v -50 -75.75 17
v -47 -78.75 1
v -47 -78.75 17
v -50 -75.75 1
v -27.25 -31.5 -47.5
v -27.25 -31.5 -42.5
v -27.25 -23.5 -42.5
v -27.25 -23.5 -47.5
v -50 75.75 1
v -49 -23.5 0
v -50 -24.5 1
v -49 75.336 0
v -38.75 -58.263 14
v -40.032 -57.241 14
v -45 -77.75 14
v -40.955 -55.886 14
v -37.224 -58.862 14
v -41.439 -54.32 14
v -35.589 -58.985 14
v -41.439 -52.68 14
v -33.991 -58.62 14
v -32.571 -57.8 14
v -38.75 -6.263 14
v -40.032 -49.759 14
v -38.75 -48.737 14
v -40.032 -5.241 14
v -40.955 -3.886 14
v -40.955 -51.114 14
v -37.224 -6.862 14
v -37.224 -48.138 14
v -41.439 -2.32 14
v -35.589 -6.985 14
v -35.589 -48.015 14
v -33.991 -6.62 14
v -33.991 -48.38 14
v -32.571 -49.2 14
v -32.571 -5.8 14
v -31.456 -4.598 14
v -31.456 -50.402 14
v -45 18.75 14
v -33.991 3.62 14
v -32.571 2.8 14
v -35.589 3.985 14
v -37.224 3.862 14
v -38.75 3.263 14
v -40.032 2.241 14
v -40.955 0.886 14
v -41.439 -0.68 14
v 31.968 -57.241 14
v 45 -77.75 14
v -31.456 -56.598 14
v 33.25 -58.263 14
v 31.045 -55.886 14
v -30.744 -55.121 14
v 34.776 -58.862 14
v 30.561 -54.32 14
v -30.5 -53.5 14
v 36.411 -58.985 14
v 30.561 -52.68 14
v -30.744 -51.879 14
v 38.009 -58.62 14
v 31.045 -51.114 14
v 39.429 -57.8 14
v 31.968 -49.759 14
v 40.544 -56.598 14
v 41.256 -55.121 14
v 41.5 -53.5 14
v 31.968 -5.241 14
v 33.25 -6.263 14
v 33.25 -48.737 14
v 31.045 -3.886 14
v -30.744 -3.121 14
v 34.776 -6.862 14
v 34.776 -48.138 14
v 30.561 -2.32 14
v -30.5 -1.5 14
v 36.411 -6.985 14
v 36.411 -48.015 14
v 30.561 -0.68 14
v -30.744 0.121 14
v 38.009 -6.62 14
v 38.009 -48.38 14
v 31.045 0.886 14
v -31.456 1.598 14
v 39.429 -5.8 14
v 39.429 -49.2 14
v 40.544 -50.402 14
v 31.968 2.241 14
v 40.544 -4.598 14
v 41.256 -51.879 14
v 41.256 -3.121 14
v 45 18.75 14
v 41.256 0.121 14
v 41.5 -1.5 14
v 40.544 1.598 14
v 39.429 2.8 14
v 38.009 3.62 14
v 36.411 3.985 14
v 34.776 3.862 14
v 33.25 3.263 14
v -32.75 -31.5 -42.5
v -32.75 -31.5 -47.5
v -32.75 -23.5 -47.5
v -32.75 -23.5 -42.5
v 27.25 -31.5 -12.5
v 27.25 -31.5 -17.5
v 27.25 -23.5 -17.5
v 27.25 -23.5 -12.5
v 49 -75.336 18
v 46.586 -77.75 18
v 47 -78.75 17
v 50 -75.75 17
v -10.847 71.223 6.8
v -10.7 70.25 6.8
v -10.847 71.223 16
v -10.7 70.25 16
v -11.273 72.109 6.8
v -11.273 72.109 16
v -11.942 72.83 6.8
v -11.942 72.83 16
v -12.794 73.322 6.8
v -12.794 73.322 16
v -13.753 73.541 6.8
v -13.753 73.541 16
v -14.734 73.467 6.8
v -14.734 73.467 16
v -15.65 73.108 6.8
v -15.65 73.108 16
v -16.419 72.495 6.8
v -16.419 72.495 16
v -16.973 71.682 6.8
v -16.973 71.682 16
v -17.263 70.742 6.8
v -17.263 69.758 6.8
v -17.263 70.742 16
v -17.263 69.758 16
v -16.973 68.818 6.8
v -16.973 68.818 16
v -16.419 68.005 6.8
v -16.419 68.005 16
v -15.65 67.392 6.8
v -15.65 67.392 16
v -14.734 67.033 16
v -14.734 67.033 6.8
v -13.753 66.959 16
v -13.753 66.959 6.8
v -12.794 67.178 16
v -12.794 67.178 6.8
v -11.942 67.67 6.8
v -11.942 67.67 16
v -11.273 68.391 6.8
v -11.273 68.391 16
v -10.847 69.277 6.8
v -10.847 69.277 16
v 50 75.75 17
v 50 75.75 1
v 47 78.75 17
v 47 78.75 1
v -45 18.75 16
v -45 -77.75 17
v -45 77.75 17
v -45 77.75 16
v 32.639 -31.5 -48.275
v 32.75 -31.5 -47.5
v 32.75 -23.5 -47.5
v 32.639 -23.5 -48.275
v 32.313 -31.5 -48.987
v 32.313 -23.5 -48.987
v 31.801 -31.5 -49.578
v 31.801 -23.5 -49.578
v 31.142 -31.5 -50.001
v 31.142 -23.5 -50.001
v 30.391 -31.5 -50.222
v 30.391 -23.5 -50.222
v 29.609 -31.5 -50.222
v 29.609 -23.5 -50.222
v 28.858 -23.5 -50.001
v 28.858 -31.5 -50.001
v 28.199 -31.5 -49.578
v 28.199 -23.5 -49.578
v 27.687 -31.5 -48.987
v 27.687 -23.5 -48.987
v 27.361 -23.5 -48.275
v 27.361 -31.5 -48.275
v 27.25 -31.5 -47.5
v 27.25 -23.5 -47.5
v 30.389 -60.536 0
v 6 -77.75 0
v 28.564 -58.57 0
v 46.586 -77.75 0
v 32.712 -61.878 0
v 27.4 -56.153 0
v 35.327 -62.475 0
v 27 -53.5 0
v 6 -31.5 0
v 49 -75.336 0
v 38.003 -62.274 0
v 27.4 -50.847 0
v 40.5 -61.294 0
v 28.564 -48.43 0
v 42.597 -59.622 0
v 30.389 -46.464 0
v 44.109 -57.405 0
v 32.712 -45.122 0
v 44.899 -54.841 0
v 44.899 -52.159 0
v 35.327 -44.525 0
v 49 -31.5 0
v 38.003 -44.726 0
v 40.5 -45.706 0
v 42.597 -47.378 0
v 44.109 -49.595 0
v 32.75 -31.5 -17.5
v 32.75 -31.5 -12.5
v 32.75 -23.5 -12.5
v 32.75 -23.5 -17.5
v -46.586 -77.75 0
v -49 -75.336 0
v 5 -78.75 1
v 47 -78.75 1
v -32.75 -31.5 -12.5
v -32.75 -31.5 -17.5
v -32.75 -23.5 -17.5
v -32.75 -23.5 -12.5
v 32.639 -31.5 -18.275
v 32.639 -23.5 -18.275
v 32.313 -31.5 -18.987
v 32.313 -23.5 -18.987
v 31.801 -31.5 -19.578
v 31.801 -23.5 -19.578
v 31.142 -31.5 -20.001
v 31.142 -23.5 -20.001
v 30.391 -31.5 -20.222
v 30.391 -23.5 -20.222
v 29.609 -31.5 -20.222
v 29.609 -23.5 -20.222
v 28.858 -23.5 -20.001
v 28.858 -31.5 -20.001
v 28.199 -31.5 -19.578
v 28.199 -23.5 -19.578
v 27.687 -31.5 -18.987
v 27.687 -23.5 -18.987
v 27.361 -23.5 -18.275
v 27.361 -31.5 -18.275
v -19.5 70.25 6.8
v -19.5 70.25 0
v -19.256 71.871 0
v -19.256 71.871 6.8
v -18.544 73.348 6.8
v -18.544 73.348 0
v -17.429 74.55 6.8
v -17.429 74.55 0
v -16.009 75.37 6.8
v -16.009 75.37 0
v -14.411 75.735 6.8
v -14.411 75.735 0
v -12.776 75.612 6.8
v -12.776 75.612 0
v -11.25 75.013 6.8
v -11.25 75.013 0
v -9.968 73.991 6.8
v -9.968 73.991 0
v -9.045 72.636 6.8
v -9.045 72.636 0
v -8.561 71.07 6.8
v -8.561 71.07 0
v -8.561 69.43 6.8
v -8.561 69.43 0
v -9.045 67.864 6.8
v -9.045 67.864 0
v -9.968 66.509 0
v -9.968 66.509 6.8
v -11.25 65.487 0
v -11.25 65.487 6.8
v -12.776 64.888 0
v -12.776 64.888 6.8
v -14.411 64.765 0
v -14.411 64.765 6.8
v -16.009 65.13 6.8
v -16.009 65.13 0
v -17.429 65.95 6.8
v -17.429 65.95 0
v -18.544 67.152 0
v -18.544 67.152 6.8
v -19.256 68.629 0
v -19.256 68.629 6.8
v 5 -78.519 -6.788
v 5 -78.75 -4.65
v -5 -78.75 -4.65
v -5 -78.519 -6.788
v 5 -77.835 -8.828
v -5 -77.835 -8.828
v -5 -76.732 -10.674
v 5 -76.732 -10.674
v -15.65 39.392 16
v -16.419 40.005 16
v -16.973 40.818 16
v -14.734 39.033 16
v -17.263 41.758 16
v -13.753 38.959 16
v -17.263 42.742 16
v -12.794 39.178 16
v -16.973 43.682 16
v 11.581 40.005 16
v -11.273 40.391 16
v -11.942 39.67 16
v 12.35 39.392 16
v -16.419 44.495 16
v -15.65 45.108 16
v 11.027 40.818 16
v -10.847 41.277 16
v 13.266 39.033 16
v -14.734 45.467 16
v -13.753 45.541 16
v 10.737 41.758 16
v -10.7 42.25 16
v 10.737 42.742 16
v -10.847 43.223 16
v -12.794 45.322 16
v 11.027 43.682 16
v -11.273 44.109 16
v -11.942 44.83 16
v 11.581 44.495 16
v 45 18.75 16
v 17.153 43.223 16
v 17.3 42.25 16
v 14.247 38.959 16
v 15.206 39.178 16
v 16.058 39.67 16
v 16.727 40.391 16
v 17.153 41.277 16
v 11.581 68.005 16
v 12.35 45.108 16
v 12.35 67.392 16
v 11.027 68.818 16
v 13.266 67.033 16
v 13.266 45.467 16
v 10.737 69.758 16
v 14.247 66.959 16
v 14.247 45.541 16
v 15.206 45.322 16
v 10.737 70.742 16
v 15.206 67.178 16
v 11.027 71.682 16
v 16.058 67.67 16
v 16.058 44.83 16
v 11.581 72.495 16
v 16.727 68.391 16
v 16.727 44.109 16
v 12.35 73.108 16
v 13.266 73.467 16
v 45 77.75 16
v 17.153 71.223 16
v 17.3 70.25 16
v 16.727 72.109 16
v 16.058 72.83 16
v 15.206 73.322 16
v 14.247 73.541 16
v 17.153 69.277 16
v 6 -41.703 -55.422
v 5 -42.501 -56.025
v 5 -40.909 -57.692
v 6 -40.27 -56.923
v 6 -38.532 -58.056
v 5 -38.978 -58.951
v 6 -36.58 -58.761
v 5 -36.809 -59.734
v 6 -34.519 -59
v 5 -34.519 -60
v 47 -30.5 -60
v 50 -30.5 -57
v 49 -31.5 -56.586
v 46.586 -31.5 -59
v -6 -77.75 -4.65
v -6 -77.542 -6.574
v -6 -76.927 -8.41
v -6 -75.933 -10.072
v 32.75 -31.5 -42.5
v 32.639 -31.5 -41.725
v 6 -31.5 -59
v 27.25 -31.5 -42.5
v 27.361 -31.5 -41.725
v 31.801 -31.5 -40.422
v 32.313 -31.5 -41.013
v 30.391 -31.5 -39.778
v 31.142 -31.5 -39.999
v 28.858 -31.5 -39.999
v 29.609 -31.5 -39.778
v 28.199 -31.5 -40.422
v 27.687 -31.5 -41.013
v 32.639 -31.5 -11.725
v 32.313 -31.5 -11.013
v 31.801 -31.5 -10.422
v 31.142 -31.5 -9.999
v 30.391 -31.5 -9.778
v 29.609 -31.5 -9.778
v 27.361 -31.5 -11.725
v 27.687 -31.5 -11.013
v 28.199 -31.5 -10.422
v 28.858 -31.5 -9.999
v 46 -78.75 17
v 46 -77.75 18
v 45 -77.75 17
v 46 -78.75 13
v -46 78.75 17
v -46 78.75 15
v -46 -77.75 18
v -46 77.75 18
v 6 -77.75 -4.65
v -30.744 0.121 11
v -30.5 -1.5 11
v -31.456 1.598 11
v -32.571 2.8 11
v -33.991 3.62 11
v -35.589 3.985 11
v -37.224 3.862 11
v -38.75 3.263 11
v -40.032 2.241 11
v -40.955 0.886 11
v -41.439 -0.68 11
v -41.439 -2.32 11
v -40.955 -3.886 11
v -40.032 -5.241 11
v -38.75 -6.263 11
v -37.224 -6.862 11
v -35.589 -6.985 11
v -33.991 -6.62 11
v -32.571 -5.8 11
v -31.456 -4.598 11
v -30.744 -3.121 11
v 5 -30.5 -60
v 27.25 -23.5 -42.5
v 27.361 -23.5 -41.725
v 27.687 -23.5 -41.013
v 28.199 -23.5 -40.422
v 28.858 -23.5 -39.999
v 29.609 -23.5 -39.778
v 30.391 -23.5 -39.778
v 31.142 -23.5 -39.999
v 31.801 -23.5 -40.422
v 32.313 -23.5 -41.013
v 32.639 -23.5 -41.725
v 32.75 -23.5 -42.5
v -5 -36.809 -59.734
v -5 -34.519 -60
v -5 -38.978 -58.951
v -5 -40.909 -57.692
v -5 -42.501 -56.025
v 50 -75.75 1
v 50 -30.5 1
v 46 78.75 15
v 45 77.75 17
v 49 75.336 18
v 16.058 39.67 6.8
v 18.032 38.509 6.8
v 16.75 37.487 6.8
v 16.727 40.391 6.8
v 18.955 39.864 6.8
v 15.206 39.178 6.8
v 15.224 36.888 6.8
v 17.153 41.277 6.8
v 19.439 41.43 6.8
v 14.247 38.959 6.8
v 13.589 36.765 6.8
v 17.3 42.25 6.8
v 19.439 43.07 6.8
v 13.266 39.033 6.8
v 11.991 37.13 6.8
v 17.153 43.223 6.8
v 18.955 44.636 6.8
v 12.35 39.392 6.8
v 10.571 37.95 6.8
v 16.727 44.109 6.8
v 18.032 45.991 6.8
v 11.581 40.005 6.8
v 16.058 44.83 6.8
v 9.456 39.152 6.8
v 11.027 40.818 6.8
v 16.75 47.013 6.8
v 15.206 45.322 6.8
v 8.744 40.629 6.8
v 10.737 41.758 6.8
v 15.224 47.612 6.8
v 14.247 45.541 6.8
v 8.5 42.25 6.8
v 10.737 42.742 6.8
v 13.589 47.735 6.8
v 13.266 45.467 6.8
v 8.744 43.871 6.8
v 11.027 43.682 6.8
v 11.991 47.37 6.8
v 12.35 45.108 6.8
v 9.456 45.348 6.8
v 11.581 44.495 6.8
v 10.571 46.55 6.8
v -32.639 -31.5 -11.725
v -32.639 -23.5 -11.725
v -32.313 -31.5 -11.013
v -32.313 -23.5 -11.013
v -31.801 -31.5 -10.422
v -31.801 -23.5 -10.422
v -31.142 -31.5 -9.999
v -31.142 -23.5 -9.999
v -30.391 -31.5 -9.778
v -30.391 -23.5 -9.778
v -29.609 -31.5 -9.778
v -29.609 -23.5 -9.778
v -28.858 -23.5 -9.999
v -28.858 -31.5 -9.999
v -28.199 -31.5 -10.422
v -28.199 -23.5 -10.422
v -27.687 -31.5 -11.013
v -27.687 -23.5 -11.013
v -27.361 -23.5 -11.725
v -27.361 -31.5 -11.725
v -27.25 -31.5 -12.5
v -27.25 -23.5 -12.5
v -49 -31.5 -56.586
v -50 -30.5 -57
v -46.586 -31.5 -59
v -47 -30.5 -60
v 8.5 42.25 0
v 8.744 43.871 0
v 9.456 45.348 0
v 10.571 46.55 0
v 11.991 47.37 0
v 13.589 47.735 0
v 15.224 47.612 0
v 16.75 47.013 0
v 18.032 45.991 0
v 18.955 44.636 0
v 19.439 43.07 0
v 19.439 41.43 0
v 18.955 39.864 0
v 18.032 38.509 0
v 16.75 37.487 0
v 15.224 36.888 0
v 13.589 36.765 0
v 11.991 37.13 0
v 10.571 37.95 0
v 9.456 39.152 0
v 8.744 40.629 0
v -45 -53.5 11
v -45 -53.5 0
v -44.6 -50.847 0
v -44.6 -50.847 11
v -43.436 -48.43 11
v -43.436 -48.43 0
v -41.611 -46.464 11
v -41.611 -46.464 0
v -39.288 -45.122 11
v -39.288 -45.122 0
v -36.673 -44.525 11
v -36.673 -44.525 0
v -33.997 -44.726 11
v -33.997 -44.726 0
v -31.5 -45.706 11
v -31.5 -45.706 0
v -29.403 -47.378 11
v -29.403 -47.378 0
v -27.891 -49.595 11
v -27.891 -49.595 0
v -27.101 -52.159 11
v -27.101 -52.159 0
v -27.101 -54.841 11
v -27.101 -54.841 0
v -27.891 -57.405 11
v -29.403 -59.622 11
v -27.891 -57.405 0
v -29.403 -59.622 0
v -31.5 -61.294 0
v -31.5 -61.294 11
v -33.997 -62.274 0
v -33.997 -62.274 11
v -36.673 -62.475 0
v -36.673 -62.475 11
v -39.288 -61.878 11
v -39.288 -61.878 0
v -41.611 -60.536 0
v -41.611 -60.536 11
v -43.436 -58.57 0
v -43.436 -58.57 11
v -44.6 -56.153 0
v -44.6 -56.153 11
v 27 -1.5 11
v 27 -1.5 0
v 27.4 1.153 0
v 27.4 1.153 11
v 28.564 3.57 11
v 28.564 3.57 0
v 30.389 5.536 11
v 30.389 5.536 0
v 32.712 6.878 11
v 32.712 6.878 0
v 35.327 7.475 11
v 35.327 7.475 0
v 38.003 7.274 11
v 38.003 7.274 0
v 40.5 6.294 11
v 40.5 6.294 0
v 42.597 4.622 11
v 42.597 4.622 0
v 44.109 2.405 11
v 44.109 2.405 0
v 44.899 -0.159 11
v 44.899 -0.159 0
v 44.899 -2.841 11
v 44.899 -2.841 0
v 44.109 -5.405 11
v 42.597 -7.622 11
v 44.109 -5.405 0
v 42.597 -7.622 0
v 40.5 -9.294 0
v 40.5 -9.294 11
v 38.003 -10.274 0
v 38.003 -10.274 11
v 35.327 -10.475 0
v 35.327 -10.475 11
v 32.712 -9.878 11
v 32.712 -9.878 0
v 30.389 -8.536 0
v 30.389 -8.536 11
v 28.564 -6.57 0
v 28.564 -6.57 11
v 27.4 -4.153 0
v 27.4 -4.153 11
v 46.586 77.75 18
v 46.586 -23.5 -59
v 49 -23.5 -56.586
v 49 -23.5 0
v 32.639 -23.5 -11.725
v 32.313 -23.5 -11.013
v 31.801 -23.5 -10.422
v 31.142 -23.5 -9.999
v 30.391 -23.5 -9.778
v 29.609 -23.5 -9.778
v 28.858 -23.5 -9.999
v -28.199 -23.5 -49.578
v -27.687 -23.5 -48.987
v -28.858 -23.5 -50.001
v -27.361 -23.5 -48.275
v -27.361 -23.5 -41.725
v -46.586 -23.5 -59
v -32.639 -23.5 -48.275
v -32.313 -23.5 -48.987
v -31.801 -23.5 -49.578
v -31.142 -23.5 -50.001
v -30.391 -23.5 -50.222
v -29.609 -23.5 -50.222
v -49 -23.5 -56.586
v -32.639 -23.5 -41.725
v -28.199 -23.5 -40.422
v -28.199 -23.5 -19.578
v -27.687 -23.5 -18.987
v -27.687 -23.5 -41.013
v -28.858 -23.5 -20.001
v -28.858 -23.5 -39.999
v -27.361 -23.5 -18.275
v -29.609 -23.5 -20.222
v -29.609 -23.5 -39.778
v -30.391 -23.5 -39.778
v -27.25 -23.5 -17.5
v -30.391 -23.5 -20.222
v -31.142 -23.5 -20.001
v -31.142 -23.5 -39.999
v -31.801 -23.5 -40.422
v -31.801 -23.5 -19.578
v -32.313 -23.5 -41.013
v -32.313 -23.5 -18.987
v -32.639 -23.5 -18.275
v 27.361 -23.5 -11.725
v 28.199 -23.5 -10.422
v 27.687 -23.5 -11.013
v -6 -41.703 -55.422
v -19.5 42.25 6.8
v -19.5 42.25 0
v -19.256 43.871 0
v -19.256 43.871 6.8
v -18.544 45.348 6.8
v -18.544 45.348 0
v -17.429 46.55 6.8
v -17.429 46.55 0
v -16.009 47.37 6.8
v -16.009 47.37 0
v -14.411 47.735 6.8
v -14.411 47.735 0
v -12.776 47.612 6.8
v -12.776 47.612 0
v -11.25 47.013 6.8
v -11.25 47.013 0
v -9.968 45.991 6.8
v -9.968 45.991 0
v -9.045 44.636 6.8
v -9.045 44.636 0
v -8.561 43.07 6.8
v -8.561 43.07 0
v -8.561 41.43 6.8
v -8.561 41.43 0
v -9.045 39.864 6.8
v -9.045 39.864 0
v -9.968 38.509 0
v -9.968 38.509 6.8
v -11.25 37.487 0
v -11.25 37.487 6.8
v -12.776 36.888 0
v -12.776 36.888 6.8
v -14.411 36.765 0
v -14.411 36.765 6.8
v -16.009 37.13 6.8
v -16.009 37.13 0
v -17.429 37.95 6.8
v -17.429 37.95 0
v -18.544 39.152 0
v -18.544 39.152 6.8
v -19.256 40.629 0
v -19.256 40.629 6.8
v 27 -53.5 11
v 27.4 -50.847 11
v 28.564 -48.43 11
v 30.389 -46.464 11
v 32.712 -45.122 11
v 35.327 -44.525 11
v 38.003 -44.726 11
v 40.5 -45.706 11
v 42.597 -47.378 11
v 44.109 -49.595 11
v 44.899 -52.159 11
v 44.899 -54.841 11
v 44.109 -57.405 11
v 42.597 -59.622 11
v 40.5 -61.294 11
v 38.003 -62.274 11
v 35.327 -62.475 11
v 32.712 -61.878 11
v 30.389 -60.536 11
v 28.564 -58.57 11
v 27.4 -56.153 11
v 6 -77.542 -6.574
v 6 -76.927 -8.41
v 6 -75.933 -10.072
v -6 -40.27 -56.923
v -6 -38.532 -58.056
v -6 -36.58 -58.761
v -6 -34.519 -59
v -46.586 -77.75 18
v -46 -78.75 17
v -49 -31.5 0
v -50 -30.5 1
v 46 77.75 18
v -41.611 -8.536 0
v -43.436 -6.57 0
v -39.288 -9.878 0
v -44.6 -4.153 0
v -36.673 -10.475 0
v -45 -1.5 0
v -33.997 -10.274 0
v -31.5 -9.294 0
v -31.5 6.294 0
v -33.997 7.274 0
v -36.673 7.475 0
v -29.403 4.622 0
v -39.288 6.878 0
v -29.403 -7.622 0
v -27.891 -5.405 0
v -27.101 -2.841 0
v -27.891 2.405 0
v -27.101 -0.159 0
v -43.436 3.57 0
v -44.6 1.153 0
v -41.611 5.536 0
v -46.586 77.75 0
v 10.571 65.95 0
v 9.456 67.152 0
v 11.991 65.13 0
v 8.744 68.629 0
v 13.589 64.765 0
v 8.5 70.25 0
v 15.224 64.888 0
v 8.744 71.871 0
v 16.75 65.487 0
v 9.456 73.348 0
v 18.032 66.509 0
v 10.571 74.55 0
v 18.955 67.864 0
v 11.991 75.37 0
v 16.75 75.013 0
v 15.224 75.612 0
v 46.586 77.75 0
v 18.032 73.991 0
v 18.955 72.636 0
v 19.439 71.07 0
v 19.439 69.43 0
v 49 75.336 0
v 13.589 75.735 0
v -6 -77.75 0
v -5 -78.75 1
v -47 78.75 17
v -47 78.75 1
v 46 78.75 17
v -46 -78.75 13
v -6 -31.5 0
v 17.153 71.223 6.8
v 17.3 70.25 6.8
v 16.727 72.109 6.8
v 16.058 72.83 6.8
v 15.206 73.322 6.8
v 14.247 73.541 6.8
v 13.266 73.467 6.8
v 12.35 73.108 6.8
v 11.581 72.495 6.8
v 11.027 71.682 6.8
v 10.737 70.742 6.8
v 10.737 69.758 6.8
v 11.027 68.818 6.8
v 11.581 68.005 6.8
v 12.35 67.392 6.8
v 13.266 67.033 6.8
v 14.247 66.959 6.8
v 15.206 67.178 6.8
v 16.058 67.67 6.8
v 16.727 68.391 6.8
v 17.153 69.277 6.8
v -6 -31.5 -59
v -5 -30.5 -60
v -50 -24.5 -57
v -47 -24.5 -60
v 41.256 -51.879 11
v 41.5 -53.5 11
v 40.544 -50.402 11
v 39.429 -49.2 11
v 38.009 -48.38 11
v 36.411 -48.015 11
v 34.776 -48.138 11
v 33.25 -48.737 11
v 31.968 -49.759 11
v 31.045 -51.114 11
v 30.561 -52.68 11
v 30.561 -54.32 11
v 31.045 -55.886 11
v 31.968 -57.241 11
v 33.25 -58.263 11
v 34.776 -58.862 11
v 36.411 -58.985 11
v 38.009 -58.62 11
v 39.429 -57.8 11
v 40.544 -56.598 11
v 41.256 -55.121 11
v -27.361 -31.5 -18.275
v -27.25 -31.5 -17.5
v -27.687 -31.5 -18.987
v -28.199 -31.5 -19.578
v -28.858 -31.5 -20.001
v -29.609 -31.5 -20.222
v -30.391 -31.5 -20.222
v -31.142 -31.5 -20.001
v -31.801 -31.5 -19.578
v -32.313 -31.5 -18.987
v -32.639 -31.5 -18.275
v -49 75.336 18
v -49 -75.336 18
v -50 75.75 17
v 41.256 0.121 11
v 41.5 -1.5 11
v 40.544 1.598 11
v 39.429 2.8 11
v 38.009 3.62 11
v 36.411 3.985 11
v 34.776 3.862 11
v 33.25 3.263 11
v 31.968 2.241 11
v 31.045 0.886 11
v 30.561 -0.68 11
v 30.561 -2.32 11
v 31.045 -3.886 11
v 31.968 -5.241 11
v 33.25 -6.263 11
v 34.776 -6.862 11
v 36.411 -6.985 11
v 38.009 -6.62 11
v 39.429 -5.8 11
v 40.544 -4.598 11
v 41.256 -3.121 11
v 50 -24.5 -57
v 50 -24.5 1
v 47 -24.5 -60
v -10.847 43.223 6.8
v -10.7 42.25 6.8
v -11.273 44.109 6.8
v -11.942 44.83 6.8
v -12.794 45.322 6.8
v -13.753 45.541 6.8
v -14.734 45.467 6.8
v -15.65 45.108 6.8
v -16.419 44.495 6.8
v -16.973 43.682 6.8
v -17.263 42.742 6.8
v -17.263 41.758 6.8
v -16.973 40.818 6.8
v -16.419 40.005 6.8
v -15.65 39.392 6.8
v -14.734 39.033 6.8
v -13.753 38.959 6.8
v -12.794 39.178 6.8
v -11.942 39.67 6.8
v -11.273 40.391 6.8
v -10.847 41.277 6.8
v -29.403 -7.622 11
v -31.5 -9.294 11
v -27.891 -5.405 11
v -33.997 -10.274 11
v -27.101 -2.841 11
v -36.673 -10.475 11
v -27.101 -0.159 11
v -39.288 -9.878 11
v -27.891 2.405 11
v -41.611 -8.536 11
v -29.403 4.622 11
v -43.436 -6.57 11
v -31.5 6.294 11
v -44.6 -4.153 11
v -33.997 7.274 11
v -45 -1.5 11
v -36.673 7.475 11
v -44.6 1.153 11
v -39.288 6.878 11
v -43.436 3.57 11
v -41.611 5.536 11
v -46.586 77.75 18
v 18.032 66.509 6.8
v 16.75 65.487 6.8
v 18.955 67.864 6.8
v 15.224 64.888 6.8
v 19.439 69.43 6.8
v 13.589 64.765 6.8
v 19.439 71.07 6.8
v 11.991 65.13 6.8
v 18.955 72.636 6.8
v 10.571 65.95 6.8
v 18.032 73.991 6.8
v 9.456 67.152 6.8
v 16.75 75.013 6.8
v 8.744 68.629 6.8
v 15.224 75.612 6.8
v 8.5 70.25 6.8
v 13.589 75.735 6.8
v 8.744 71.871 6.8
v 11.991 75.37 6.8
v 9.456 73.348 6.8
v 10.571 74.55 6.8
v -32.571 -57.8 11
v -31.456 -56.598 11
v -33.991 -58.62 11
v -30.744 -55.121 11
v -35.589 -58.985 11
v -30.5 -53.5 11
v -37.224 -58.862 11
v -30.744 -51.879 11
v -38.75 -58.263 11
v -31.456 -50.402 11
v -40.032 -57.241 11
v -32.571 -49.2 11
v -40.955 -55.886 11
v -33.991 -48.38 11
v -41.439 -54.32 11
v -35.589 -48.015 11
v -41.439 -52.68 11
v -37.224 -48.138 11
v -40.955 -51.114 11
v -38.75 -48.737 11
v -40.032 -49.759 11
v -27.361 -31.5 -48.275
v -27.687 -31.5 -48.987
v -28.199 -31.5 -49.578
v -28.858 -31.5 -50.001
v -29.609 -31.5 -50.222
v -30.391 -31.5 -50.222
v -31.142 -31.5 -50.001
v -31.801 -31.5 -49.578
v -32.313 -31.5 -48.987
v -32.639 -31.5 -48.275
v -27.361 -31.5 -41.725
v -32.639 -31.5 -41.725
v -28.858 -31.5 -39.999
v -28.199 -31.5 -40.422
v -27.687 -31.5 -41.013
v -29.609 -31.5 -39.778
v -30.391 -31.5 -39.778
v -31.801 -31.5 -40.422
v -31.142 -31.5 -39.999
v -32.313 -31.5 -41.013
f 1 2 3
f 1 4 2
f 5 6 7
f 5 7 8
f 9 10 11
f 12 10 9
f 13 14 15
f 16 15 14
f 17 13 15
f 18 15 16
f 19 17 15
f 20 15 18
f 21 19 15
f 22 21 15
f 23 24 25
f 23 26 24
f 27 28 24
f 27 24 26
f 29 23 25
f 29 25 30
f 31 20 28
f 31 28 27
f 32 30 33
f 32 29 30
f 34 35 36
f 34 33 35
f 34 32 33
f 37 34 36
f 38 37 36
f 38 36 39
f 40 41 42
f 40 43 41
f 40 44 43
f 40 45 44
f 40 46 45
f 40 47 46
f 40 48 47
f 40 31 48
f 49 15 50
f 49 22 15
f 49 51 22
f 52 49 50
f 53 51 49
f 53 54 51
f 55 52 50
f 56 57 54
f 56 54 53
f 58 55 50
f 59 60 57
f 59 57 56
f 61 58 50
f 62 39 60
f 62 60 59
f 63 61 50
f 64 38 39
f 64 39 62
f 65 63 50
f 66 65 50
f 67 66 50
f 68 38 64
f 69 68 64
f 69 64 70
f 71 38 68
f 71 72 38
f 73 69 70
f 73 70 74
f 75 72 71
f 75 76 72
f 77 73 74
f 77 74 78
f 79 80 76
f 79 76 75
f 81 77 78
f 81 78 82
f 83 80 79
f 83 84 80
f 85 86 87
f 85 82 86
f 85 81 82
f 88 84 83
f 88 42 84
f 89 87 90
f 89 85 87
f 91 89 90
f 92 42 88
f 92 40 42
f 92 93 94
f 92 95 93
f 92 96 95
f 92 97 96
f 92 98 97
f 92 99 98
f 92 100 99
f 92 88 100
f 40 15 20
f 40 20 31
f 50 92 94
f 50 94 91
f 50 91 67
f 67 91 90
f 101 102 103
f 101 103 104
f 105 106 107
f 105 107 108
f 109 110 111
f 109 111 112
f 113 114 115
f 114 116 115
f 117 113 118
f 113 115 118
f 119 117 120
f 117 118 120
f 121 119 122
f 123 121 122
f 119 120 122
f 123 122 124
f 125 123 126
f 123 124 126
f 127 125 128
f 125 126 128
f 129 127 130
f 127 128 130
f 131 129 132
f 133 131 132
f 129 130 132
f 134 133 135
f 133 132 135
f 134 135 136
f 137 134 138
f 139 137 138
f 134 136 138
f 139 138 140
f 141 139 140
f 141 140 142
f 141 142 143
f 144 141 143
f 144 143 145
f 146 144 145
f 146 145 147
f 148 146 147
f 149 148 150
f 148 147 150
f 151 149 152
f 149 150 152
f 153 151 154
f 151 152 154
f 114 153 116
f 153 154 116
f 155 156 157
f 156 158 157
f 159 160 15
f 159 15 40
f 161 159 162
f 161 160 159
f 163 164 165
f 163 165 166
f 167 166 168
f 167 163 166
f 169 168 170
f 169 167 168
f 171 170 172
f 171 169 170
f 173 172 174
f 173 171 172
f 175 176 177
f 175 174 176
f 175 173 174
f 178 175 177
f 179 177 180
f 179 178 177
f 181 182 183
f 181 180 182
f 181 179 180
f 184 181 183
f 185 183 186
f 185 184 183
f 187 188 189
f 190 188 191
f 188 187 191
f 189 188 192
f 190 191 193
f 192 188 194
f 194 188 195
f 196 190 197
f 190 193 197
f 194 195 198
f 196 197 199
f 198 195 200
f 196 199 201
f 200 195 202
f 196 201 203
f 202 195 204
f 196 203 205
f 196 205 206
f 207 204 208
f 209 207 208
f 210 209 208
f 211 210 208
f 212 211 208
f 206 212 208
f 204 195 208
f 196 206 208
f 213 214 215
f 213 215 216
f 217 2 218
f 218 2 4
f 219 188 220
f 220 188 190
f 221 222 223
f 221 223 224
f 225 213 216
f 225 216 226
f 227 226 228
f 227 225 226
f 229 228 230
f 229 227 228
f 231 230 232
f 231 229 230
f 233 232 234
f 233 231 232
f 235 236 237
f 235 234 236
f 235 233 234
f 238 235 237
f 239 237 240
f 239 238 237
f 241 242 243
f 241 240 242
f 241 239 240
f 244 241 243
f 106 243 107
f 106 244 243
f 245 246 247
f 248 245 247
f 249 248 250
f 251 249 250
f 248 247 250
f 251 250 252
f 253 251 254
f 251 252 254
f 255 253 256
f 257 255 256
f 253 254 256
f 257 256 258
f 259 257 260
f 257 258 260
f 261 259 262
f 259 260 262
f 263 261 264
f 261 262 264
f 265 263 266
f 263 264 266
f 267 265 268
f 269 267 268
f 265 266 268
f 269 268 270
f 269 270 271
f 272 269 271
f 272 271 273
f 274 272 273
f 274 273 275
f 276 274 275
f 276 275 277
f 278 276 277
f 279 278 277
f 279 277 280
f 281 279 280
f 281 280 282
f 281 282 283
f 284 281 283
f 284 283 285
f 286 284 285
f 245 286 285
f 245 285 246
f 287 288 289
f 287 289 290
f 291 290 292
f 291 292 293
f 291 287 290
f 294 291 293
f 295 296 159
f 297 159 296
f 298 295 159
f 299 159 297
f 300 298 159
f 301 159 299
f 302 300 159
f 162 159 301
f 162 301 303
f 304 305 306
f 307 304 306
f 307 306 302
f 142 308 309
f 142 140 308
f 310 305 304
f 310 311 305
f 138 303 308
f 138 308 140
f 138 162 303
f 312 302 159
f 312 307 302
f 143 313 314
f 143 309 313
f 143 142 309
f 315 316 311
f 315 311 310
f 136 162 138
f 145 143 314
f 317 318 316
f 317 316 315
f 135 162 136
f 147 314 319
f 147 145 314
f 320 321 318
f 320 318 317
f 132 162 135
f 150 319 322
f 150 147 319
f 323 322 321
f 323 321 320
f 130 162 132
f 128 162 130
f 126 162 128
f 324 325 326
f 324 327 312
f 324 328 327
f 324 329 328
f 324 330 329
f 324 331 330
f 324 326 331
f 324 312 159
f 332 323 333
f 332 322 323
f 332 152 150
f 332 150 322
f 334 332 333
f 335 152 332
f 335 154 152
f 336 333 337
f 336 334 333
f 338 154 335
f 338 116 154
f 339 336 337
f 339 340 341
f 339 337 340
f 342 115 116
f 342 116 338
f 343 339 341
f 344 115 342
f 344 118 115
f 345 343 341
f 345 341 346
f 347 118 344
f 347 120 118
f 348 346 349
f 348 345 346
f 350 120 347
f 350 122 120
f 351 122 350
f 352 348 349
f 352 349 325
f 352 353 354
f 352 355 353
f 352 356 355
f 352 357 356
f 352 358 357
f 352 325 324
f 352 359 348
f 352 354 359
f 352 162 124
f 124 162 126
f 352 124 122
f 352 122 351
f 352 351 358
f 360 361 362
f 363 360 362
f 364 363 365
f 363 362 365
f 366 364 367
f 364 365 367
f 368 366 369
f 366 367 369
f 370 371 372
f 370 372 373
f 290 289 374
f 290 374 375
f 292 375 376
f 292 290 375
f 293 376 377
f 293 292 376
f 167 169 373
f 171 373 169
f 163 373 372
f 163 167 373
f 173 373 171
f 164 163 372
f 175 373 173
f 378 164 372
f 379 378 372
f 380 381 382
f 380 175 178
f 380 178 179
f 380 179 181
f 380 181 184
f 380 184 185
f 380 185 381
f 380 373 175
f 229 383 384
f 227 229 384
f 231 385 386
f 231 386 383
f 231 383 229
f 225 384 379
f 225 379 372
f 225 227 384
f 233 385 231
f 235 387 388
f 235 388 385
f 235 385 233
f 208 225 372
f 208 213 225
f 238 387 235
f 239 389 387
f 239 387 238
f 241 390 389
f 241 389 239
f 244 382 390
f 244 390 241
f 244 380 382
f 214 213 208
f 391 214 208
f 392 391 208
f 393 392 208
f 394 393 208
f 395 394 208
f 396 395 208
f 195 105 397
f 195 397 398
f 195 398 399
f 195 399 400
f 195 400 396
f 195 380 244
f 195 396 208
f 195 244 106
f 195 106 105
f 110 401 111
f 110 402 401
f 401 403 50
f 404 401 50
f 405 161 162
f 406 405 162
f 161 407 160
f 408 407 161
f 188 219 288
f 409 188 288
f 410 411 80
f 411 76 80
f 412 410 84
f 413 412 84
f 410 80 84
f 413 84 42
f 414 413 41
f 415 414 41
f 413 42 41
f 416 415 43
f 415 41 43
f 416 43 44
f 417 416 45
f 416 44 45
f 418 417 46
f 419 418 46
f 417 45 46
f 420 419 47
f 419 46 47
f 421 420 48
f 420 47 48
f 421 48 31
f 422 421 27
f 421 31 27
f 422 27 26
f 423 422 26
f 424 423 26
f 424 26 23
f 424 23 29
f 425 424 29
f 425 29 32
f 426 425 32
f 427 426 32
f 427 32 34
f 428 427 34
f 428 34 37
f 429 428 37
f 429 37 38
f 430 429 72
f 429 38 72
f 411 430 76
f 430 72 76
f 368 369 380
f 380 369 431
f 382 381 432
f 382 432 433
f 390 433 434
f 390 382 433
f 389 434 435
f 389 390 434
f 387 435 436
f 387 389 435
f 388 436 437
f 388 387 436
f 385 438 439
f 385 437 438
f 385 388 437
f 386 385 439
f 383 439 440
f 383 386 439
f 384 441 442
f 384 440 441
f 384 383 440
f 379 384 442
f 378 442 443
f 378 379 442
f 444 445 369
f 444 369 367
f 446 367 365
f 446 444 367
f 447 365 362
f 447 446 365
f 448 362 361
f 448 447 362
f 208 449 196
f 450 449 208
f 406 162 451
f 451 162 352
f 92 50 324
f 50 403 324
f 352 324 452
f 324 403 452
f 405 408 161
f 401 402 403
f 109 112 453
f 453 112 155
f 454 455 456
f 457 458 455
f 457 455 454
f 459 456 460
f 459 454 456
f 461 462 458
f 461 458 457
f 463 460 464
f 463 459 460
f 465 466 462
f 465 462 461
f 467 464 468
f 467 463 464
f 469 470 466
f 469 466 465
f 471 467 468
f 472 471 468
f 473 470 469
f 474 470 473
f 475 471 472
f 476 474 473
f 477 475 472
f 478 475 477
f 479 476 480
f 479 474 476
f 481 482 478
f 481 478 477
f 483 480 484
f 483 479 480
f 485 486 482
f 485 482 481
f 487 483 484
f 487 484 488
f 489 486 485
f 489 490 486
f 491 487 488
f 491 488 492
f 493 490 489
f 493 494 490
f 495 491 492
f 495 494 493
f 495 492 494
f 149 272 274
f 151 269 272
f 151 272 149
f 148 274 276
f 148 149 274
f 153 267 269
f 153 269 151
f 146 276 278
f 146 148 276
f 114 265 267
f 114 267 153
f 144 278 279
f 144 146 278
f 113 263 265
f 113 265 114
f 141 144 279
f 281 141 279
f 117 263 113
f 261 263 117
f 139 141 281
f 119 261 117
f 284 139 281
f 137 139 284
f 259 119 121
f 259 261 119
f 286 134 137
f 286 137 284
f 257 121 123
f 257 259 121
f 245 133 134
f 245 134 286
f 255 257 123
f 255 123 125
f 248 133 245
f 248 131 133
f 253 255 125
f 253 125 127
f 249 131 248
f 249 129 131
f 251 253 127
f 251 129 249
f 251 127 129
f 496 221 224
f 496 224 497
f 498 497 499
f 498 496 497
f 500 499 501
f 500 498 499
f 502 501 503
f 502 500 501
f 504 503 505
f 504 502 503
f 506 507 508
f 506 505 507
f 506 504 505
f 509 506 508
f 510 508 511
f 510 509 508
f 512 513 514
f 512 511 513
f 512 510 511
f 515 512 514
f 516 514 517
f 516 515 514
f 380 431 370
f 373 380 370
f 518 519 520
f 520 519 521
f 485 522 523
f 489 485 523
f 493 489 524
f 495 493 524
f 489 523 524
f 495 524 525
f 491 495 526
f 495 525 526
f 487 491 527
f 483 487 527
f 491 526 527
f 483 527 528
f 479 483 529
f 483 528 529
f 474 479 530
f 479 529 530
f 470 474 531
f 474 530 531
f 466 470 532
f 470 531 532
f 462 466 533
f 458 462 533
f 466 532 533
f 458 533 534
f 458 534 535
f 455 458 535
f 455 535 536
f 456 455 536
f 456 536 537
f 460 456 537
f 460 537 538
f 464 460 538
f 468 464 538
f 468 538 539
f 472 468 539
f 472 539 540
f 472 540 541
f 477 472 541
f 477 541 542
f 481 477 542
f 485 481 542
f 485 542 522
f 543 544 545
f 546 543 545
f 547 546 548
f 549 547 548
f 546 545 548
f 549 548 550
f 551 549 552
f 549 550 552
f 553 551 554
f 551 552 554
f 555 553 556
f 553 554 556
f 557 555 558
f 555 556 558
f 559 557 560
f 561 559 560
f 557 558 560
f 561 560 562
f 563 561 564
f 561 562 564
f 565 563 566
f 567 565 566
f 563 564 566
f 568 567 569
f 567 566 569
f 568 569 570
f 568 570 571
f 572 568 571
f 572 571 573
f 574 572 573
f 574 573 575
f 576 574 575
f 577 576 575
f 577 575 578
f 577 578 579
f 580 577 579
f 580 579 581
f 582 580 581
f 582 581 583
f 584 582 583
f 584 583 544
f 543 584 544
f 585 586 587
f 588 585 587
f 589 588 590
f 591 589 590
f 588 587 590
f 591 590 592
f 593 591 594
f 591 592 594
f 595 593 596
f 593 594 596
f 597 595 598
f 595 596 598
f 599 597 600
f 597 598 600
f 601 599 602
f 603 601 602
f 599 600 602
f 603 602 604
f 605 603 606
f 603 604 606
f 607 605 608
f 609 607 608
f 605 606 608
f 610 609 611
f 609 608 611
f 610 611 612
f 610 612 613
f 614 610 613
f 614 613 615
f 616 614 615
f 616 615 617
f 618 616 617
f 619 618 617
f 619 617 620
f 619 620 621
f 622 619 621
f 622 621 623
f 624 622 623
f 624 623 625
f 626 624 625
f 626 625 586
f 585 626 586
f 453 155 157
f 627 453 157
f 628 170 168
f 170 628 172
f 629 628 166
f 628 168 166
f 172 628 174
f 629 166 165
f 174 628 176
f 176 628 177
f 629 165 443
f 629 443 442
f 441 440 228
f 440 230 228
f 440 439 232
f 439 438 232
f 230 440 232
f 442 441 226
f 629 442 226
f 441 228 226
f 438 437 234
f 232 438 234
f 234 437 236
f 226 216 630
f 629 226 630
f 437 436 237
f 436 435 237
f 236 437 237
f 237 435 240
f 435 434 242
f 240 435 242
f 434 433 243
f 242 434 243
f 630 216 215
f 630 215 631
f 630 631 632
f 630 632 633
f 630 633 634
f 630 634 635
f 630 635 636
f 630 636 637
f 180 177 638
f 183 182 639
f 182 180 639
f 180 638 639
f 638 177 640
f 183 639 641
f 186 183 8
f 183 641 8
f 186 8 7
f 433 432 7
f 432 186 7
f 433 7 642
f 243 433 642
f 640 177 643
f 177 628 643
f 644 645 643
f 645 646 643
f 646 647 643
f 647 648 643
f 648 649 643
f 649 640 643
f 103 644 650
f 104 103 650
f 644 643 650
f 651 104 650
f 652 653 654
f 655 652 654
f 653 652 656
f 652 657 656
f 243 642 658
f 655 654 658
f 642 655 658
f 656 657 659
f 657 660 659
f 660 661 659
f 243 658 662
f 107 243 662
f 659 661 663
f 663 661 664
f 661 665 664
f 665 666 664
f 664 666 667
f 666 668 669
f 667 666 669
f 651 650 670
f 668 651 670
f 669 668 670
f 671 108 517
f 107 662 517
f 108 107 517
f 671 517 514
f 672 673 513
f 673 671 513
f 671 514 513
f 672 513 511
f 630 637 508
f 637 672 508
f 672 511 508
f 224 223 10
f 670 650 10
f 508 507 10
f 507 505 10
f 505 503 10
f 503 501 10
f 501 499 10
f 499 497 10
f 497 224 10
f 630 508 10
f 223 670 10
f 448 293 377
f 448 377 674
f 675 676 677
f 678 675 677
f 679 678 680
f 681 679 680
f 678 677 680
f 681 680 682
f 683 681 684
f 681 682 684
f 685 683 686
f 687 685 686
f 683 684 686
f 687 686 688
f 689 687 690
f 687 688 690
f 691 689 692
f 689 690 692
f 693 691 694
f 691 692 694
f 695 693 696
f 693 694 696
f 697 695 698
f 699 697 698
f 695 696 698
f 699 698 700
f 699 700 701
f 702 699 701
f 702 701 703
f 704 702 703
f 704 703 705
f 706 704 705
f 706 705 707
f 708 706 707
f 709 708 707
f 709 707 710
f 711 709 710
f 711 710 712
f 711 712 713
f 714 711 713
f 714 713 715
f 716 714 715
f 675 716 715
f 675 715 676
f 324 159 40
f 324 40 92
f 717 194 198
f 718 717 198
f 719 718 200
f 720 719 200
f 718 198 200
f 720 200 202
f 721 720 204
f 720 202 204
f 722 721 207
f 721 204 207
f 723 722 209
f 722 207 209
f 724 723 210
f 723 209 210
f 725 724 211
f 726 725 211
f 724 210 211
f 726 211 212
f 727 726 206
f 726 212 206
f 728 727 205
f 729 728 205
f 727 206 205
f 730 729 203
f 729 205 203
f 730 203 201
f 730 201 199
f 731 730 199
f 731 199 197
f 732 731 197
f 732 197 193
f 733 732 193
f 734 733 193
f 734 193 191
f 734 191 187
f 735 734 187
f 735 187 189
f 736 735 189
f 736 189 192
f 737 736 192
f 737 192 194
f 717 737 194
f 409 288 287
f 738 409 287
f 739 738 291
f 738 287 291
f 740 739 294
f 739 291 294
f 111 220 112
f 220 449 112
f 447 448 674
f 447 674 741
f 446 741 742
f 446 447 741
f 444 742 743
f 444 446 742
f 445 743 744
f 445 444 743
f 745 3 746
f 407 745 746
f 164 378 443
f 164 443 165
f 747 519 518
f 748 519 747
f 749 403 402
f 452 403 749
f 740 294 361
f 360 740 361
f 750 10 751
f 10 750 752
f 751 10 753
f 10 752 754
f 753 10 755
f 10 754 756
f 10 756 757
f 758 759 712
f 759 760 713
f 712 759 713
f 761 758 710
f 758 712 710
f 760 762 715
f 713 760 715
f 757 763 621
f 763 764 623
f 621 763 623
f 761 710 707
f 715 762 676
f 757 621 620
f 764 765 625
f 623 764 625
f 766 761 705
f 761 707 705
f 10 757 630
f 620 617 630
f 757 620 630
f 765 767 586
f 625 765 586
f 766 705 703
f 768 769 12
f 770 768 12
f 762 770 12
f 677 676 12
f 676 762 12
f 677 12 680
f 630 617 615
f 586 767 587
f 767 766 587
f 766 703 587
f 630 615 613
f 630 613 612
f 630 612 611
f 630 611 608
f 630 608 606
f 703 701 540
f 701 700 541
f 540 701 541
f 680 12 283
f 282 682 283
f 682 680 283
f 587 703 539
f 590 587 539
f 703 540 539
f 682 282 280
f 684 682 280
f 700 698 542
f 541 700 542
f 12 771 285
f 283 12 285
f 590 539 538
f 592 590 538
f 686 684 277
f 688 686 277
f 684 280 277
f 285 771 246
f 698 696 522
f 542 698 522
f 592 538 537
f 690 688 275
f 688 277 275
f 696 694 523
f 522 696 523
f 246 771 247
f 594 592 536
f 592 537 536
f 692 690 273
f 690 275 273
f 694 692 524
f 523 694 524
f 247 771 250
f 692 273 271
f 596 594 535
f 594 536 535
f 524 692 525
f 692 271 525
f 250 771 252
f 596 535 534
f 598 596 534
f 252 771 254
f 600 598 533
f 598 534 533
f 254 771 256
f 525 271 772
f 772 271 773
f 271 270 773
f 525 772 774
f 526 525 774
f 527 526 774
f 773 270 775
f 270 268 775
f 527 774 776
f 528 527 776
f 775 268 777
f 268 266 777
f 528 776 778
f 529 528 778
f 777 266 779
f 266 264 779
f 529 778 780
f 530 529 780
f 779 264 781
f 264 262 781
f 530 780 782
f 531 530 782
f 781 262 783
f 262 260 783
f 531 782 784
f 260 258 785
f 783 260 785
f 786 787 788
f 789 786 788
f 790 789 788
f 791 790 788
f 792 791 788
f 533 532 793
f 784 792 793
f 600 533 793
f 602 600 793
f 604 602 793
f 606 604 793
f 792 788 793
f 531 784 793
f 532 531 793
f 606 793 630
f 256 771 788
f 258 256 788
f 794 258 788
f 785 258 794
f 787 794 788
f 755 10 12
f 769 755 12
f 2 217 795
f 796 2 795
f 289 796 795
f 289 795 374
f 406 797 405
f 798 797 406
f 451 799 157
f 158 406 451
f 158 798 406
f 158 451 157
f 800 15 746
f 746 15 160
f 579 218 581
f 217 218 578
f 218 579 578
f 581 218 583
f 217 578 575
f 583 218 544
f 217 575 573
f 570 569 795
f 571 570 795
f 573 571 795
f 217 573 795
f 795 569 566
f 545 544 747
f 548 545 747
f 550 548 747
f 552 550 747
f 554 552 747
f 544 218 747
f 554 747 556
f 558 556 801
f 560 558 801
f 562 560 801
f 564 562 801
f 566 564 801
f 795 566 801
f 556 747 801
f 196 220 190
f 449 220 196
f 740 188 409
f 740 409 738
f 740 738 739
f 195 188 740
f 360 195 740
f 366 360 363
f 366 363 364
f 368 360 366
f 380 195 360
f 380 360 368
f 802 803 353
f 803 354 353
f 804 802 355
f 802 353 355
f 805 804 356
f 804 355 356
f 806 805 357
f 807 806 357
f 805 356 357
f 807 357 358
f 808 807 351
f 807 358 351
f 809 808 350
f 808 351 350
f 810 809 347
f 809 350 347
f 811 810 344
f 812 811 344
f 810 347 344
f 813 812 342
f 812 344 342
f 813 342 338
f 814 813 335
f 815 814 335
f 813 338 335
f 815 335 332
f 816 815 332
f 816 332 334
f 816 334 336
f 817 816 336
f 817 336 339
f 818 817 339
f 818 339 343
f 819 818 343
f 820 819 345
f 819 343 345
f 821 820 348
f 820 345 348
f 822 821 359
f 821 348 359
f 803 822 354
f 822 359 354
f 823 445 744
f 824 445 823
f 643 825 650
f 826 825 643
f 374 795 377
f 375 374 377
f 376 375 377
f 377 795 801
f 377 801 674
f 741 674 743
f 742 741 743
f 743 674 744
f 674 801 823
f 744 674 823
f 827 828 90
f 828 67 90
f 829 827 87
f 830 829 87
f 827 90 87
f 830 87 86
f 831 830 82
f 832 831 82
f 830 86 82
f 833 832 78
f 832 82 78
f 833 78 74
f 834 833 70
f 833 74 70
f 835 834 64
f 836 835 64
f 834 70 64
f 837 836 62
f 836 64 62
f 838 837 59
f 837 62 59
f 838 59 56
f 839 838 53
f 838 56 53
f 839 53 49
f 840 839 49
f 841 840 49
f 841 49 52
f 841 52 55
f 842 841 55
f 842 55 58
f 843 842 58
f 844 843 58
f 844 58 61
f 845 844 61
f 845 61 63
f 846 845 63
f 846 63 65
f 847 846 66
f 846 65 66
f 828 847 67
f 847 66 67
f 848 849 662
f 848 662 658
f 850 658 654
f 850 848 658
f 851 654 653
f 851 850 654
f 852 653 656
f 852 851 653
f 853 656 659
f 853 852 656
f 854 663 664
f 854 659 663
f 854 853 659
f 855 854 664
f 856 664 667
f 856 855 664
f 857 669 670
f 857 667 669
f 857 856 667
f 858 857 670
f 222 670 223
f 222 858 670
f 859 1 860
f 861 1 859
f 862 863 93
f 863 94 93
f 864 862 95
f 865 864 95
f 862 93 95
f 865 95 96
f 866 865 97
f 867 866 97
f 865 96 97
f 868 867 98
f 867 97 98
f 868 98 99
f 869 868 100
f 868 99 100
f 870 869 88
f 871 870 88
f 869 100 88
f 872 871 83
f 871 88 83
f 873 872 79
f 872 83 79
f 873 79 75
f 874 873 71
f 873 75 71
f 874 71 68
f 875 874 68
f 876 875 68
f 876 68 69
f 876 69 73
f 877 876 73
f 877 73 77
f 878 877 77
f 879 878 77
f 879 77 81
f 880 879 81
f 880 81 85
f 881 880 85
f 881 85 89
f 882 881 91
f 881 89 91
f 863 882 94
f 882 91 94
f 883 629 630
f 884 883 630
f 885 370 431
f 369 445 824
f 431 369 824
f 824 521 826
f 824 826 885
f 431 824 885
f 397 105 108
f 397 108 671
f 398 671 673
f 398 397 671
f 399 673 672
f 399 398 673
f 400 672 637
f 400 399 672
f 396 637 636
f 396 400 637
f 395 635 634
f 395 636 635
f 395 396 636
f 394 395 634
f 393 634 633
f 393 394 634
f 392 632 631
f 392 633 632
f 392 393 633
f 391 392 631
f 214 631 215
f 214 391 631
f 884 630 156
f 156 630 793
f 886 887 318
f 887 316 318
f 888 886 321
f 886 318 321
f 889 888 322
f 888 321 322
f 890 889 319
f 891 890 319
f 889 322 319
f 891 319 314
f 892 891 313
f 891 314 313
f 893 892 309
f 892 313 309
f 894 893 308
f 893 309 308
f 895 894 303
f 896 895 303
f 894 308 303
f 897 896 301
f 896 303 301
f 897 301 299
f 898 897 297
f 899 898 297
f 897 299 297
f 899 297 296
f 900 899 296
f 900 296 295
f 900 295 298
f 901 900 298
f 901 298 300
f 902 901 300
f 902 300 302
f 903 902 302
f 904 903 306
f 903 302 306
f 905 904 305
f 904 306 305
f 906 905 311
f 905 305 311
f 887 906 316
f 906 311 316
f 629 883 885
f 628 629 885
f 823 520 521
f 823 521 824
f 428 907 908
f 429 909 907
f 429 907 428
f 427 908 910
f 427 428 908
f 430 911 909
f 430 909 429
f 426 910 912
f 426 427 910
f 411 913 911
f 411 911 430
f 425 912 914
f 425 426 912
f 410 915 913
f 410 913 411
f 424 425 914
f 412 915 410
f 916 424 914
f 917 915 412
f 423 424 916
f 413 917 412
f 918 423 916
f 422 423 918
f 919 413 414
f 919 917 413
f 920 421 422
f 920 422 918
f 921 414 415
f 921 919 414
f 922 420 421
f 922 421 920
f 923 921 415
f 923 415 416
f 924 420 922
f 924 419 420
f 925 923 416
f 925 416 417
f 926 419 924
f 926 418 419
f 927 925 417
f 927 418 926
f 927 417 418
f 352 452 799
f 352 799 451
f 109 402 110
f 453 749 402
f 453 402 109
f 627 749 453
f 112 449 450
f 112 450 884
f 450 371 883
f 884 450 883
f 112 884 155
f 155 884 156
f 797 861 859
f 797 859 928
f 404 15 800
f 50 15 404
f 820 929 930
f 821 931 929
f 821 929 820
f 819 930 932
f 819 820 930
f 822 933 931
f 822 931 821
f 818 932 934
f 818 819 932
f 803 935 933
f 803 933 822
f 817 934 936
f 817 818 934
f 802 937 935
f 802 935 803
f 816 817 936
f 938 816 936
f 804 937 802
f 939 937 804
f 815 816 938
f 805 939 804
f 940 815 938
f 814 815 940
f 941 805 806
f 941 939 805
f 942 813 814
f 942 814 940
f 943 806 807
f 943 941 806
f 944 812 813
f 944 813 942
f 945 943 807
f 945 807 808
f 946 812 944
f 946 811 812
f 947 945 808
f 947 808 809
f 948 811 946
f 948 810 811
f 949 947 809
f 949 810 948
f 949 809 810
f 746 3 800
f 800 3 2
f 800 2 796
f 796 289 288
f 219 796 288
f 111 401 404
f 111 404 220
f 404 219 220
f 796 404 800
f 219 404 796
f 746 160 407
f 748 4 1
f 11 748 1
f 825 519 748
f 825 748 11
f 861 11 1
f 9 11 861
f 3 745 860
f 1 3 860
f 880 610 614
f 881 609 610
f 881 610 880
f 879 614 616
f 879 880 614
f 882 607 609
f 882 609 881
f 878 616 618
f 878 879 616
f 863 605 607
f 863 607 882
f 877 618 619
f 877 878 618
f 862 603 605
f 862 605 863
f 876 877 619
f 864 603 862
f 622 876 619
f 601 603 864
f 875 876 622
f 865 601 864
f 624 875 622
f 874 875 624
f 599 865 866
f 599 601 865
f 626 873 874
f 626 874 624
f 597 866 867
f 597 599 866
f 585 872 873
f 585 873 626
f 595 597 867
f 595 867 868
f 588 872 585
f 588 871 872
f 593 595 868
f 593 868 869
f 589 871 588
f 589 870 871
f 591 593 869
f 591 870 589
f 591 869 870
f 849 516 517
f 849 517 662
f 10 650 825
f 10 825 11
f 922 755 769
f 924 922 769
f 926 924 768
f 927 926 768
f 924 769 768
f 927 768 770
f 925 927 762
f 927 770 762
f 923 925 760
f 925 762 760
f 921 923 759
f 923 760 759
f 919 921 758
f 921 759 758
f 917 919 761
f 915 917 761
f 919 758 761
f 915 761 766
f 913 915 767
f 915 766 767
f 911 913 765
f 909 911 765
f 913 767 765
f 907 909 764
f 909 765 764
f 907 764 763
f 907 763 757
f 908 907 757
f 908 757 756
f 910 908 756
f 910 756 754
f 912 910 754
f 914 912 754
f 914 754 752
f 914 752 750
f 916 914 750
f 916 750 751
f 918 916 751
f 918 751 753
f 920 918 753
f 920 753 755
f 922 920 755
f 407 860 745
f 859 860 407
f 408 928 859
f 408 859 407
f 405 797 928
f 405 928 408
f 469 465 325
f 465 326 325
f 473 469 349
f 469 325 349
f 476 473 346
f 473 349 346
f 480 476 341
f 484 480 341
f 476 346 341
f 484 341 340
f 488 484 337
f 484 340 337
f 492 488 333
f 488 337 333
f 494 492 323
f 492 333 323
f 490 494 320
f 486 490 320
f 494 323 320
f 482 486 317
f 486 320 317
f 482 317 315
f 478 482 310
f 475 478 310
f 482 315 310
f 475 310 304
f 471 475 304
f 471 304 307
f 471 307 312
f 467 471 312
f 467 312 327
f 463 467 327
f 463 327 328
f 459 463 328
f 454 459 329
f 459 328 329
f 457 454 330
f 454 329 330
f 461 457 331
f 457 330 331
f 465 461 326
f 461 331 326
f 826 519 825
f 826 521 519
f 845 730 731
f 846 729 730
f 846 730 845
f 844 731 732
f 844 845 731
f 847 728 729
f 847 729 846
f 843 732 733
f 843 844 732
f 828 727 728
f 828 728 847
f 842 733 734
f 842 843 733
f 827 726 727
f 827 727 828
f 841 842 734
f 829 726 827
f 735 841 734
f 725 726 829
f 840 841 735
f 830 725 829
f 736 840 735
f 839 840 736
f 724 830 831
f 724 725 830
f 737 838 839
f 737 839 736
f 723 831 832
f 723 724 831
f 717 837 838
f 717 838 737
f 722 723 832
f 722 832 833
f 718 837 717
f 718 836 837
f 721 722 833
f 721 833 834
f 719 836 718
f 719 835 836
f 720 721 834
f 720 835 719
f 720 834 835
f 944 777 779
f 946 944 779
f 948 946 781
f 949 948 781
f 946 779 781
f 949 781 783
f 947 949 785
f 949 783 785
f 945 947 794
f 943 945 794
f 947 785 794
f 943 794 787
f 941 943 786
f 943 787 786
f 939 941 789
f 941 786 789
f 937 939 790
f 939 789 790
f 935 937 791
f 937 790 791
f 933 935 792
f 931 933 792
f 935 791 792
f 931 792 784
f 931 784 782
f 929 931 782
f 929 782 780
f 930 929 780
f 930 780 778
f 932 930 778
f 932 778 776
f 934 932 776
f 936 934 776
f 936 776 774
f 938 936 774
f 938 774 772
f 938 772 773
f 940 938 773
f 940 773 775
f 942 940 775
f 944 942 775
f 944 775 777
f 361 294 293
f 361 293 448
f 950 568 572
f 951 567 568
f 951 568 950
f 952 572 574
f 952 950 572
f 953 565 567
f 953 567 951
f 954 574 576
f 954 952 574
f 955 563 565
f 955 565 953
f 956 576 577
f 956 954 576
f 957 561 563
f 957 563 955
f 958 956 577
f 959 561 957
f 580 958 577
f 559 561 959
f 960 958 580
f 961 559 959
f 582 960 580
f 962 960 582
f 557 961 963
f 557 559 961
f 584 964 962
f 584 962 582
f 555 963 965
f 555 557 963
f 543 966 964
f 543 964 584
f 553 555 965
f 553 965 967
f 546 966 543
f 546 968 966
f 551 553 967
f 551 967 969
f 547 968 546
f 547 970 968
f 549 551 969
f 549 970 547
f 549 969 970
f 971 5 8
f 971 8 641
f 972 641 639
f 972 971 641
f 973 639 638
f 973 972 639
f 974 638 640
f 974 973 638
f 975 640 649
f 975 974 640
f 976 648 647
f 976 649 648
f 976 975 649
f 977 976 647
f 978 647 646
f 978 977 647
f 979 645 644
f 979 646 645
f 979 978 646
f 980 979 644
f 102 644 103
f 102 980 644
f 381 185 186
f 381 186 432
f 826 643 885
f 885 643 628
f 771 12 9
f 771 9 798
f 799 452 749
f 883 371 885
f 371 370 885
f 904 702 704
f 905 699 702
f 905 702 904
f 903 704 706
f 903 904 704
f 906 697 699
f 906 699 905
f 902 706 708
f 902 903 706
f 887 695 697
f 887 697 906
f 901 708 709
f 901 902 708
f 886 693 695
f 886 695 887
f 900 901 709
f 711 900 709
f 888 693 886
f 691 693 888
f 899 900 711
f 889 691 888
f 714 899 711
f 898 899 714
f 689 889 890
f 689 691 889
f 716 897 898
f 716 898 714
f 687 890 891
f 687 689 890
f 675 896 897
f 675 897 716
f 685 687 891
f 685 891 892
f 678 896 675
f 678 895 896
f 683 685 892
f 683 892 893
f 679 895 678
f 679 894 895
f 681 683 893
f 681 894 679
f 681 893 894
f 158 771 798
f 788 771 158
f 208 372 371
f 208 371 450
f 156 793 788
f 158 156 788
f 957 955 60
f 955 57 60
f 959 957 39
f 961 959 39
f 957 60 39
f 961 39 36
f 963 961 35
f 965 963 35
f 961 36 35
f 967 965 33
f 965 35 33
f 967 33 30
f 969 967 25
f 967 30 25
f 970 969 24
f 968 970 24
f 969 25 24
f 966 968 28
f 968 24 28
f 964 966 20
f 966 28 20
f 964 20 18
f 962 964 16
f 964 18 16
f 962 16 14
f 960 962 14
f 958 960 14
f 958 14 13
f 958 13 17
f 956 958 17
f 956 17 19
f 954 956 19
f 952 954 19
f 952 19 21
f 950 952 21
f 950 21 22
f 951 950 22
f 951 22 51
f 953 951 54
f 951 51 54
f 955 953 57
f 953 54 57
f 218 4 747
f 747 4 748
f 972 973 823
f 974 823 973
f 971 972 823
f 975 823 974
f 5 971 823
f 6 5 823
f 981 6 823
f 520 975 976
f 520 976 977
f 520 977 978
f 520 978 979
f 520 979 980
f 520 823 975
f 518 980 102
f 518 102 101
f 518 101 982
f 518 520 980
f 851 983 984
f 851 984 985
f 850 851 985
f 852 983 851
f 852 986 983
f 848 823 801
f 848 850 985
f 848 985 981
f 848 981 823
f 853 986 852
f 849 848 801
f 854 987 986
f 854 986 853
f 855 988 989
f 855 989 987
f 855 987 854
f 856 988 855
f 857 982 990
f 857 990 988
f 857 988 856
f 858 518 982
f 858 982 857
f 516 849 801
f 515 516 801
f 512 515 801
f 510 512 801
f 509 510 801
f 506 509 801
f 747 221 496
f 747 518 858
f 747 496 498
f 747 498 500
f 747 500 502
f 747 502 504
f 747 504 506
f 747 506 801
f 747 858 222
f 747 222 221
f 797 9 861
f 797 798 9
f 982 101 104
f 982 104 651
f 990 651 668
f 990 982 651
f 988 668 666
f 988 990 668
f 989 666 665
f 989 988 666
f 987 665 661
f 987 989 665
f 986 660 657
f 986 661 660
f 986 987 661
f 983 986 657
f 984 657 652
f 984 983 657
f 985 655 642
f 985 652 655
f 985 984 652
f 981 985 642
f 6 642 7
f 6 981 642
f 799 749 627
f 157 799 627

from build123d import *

# Parameters (mm, degrees)
SKETCH_1_W                = 100
SKETCH_1_H                = 157.5
EXTRUDE_1_DEPTH           = 18
SKETCH_2_W                = 90
SKETCH_2_H                = 220
CUT_EXTRUDE_1_DEPTH       = 2
SKETCH_3_W                = 90
SKETCH_3_H                = 195
CUT_EXTRUDE_2_DEPTH       = 2
SKETCH_4_W                = 60
SKETCH_4_H                = 8
EXTRUDE_2_DEPTH           = 100
EXTRUDE_3_DEPTH           = 6
HOLE_WIZARD_0_D           = 11
HOLE_WIZARD_0_CBORE_D     = 18
HOLE_WIZARD_0_CBORE_DEPTH = 11
HOLE_WIZARD_1_D           = 6.6
HOLE_WIZARD_1_CBORE_D     = 11
HOLE_WIZARD_1_CBORE_DEPTH = 6.8
FILLET_1_R                = 10
CUT_EXTRUDE_3_DEPTH       = 136.111296715
CHAMFER_1_SIZE            = 3
CHAMFER_2_SIZE            = 1


with BuildPart() as part:
    # 草图1 → 凸台-拉伸1 (new body)
    with BuildSketch(Plane.XY):
        Rectangle(SKETCH_1_W, SKETCH_1_H)
    extrude(amount=EXTRUDE_1_DEPTH)

    # 草图2 → 切除-拉伸1 (cut)
    with BuildSketch(Plane.XY.offset(18)):
        Rectangle(SKETCH_2_W, SKETCH_2_H)
    extrude(amount=-CUT_EXTRUDE_1_DEPTH, mode=Mode.SUBTRACT)

    # 草图3 → 切除-拉伸2 (cut)
    with BuildSketch(Plane.XY.offset(16)):
        with Locations((0, -78.75)):
            Rectangle(SKETCH_3_W, SKETCH_3_H)
    extrude(amount=-CUT_EXTRUDE_2_DEPTH, mode=Mode.SUBTRACT)

    # 草图4 → 凸台-拉伸2 (add)
    with BuildSketch(Plane.ZY.offset(50)):
        with Locations((-30, -27.5)):
            Rectangle(SKETCH_4_W, SKETCH_4_H)
    extrude(amount=-EXTRUDE_2_DEPTH)

    # 草图5 → 凸台-拉伸3 (add, symmetric)
    with BuildSketch(Plane(origin=(0, 0, 0), x_dir=(0, 0, -1), z_dir=(1, 0, 0))):
        Polygon((0, -31.5), (0, -78.75), (8, -78.75), (60, -39.5), (60, -31.5), align=None)
    extrude(amount=EXTRUDE_3_DEPTH, both=True)

    # 打孔尺寸(%根据)内六角圆柱头螺钉的类型0 (through all)
    with Locations(Plane(origin=(0, 0, 0), x_dir=(-1, 0, 0), z_dir=(0, 0, -1))):
        with Locations((-36, -1.5), (36, -1.5), (36, -53.5), (-36, -53.5)):
            CounterBoreHole(HOLE_WIZARD_0_D / 2, HOLE_WIZARD_0_CBORE_D / 2, HOLE_WIZARD_0_CBORE_DEPTH)

    # 打孔尺寸(%根据)内六角圆柱头螺钉的类型1 (through all)
    with Locations(Plane(origin=(0, 0, 0), x_dir=(-1, 0, 0), z_dir=(0, 0, -1))):
        with Locations((-14, 70.25), (-14, 42.25), (14, 70.25), (14, 42.25)):
            CounterBoreHole(HOLE_WIZARD_1_D / 2, HOLE_WIZARD_1_CBORE_D / 2, HOLE_WIZARD_1_CBORE_DEPTH)

    # 圆角1
    fillet_1_edges = [part.edges().sort_by_distance(p)[0] for p in [
        (0, -78.75, -8),
        (0, -39.5, -60),
    ]]
    fillet(fillet_1_edges, radius=FILLET_1_R)

    # 草图12 → 切除-拉伸3 (cut, through all)
    with BuildSketch(Plane.XZ.offset(31.5)):
        with BuildLine():
            Line((32.75, -42.5), (32.75, -47.5))
            ThreePointArc((32.75, -47.5), (30, -50.25), (27.25, -47.5))
            Line((27.25, -47.5), (27.25, -42.5))
            ThreePointArc((27.25, -42.5), (30, -39.75), (32.75, -42.5))
        make_face()
        with BuildLine():
            Line((32.75, -12.5), (32.75, -17.5))
            ThreePointArc((32.75, -17.5), (30, -20.25), (27.25, -17.5))
            Line((27.25, -17.5), (27.25, -12.5))
            ThreePointArc((27.25, -12.5), (30, -9.75), (32.75, -12.5))
        make_face()
        with BuildLine():
            Line((-32.75, -47.5), (-32.75, -42.5))
            ThreePointArc((-32.75, -42.5), (-30, -39.75), (-27.25, -42.5))
            Line((-27.25, -42.5), (-27.25, -47.5))
            ThreePointArc((-27.25, -47.5), (-30, -50.25), (-32.75, -47.5))
        make_face()
        with BuildLine():
            Line((-27.25, -12.5), (-27.25, -17.5))
            ThreePointArc((-27.25, -17.5), (-30, -20.25), (-32.75, -17.5))
            Line((-32.75, -17.5), (-32.75, -12.5))
            ThreePointArc((-32.75, -12.5), (-30, -9.75), (-27.25, -12.5))
        make_face()
    extrude(amount=-CUT_EXTRUDE_3_DEPTH, mode=Mode.SUBTRACT)

    # 倒角1
    chamfer_1_edges = [part.edges().sort_by_distance(p)[0] for p in [
        (-50, -27.5, -60),
        (50, -27.5, -60),
        (50, -78.75, 9),
        (-50, -78.75, 9),
        (-50, 78.75, 9),
        (50, 78.75, 9),
    ]]
    chamfer(chamfer_1_edges, length=CHAMFER_1_SIZE)

    # 倒角2
    chamfer_2_edges = [part.edges().sort_by_distance(p)[0] for p in [
        (-46, 78.75, 18),
        (46, -78.75, 18),
        (-45, 0, 18),
        (45, 0, 18),
        (-6, -59.616129225, -33.349331982),
        (6, -59.616129225, -33.349331982),
        (-6, -33.009585867, -60),
        (-6, -38.977573733, -58.951125718),
        (-6, -78.231967981, -7.826438724),
        (6, -33.009585867, -60),
        (6, -38.977573733, -58.951125718),
        (6, -78.231967981, -7.826438724),
        (0, 78.75, 16),
        (45, 78.75, 17),
        (45, -78.75, 16),
        (-45, 78.75, 17),
        (-45, -78.75, 16),
        (50, -53.625, 0),
        (50, -23.5, -28.5),
        (50, 0, 18),
        (0, -23.5, -60),
        (-48.5, -23.5, -58.5),
        (48.5, -23.5, -58.5),
        (26.5, -31.5, -60),
        (48.5, -31.5, -58.5),
        (-50, 26.125, 0),
        (-50, -31.5, -28.5),
        (-50, 0, 18),
        (-48.5, -31.5, -58.5),
        (-46, -78.75, 18),
        (-26.5, -78.75, 0),
        (-48.5, -77.25, 0),
        (-48.5, 77.25, 18),
        (-48.5, -77.25, 18),
        (48.5, -77.25, 0),
        (46, 78.75, 18),
        (48.5, 77.25, 18),
        (48.5, -77.25, 18),
        (0, 78.75, 0),
        (-48.5, 77.25, 0),
        (48.5, 77.25, 0),
        (0, -78.75, 14),
        (50, 26.125, 0),
        (-50, -53.625, 0),
        (-50, -23.5, -28.5),
        (50, -31.5, -28.5),
        (-26.5, -31.5, -60),
        (26.5, -78.75, 0),
        (-6, -78.75, -2.324801658),
        (6, -78.75, -2.324801658),
    ]]
    chamfer(chamfer_2_edges, length=CHAMFER_2_SIZE)


solid = part.part
